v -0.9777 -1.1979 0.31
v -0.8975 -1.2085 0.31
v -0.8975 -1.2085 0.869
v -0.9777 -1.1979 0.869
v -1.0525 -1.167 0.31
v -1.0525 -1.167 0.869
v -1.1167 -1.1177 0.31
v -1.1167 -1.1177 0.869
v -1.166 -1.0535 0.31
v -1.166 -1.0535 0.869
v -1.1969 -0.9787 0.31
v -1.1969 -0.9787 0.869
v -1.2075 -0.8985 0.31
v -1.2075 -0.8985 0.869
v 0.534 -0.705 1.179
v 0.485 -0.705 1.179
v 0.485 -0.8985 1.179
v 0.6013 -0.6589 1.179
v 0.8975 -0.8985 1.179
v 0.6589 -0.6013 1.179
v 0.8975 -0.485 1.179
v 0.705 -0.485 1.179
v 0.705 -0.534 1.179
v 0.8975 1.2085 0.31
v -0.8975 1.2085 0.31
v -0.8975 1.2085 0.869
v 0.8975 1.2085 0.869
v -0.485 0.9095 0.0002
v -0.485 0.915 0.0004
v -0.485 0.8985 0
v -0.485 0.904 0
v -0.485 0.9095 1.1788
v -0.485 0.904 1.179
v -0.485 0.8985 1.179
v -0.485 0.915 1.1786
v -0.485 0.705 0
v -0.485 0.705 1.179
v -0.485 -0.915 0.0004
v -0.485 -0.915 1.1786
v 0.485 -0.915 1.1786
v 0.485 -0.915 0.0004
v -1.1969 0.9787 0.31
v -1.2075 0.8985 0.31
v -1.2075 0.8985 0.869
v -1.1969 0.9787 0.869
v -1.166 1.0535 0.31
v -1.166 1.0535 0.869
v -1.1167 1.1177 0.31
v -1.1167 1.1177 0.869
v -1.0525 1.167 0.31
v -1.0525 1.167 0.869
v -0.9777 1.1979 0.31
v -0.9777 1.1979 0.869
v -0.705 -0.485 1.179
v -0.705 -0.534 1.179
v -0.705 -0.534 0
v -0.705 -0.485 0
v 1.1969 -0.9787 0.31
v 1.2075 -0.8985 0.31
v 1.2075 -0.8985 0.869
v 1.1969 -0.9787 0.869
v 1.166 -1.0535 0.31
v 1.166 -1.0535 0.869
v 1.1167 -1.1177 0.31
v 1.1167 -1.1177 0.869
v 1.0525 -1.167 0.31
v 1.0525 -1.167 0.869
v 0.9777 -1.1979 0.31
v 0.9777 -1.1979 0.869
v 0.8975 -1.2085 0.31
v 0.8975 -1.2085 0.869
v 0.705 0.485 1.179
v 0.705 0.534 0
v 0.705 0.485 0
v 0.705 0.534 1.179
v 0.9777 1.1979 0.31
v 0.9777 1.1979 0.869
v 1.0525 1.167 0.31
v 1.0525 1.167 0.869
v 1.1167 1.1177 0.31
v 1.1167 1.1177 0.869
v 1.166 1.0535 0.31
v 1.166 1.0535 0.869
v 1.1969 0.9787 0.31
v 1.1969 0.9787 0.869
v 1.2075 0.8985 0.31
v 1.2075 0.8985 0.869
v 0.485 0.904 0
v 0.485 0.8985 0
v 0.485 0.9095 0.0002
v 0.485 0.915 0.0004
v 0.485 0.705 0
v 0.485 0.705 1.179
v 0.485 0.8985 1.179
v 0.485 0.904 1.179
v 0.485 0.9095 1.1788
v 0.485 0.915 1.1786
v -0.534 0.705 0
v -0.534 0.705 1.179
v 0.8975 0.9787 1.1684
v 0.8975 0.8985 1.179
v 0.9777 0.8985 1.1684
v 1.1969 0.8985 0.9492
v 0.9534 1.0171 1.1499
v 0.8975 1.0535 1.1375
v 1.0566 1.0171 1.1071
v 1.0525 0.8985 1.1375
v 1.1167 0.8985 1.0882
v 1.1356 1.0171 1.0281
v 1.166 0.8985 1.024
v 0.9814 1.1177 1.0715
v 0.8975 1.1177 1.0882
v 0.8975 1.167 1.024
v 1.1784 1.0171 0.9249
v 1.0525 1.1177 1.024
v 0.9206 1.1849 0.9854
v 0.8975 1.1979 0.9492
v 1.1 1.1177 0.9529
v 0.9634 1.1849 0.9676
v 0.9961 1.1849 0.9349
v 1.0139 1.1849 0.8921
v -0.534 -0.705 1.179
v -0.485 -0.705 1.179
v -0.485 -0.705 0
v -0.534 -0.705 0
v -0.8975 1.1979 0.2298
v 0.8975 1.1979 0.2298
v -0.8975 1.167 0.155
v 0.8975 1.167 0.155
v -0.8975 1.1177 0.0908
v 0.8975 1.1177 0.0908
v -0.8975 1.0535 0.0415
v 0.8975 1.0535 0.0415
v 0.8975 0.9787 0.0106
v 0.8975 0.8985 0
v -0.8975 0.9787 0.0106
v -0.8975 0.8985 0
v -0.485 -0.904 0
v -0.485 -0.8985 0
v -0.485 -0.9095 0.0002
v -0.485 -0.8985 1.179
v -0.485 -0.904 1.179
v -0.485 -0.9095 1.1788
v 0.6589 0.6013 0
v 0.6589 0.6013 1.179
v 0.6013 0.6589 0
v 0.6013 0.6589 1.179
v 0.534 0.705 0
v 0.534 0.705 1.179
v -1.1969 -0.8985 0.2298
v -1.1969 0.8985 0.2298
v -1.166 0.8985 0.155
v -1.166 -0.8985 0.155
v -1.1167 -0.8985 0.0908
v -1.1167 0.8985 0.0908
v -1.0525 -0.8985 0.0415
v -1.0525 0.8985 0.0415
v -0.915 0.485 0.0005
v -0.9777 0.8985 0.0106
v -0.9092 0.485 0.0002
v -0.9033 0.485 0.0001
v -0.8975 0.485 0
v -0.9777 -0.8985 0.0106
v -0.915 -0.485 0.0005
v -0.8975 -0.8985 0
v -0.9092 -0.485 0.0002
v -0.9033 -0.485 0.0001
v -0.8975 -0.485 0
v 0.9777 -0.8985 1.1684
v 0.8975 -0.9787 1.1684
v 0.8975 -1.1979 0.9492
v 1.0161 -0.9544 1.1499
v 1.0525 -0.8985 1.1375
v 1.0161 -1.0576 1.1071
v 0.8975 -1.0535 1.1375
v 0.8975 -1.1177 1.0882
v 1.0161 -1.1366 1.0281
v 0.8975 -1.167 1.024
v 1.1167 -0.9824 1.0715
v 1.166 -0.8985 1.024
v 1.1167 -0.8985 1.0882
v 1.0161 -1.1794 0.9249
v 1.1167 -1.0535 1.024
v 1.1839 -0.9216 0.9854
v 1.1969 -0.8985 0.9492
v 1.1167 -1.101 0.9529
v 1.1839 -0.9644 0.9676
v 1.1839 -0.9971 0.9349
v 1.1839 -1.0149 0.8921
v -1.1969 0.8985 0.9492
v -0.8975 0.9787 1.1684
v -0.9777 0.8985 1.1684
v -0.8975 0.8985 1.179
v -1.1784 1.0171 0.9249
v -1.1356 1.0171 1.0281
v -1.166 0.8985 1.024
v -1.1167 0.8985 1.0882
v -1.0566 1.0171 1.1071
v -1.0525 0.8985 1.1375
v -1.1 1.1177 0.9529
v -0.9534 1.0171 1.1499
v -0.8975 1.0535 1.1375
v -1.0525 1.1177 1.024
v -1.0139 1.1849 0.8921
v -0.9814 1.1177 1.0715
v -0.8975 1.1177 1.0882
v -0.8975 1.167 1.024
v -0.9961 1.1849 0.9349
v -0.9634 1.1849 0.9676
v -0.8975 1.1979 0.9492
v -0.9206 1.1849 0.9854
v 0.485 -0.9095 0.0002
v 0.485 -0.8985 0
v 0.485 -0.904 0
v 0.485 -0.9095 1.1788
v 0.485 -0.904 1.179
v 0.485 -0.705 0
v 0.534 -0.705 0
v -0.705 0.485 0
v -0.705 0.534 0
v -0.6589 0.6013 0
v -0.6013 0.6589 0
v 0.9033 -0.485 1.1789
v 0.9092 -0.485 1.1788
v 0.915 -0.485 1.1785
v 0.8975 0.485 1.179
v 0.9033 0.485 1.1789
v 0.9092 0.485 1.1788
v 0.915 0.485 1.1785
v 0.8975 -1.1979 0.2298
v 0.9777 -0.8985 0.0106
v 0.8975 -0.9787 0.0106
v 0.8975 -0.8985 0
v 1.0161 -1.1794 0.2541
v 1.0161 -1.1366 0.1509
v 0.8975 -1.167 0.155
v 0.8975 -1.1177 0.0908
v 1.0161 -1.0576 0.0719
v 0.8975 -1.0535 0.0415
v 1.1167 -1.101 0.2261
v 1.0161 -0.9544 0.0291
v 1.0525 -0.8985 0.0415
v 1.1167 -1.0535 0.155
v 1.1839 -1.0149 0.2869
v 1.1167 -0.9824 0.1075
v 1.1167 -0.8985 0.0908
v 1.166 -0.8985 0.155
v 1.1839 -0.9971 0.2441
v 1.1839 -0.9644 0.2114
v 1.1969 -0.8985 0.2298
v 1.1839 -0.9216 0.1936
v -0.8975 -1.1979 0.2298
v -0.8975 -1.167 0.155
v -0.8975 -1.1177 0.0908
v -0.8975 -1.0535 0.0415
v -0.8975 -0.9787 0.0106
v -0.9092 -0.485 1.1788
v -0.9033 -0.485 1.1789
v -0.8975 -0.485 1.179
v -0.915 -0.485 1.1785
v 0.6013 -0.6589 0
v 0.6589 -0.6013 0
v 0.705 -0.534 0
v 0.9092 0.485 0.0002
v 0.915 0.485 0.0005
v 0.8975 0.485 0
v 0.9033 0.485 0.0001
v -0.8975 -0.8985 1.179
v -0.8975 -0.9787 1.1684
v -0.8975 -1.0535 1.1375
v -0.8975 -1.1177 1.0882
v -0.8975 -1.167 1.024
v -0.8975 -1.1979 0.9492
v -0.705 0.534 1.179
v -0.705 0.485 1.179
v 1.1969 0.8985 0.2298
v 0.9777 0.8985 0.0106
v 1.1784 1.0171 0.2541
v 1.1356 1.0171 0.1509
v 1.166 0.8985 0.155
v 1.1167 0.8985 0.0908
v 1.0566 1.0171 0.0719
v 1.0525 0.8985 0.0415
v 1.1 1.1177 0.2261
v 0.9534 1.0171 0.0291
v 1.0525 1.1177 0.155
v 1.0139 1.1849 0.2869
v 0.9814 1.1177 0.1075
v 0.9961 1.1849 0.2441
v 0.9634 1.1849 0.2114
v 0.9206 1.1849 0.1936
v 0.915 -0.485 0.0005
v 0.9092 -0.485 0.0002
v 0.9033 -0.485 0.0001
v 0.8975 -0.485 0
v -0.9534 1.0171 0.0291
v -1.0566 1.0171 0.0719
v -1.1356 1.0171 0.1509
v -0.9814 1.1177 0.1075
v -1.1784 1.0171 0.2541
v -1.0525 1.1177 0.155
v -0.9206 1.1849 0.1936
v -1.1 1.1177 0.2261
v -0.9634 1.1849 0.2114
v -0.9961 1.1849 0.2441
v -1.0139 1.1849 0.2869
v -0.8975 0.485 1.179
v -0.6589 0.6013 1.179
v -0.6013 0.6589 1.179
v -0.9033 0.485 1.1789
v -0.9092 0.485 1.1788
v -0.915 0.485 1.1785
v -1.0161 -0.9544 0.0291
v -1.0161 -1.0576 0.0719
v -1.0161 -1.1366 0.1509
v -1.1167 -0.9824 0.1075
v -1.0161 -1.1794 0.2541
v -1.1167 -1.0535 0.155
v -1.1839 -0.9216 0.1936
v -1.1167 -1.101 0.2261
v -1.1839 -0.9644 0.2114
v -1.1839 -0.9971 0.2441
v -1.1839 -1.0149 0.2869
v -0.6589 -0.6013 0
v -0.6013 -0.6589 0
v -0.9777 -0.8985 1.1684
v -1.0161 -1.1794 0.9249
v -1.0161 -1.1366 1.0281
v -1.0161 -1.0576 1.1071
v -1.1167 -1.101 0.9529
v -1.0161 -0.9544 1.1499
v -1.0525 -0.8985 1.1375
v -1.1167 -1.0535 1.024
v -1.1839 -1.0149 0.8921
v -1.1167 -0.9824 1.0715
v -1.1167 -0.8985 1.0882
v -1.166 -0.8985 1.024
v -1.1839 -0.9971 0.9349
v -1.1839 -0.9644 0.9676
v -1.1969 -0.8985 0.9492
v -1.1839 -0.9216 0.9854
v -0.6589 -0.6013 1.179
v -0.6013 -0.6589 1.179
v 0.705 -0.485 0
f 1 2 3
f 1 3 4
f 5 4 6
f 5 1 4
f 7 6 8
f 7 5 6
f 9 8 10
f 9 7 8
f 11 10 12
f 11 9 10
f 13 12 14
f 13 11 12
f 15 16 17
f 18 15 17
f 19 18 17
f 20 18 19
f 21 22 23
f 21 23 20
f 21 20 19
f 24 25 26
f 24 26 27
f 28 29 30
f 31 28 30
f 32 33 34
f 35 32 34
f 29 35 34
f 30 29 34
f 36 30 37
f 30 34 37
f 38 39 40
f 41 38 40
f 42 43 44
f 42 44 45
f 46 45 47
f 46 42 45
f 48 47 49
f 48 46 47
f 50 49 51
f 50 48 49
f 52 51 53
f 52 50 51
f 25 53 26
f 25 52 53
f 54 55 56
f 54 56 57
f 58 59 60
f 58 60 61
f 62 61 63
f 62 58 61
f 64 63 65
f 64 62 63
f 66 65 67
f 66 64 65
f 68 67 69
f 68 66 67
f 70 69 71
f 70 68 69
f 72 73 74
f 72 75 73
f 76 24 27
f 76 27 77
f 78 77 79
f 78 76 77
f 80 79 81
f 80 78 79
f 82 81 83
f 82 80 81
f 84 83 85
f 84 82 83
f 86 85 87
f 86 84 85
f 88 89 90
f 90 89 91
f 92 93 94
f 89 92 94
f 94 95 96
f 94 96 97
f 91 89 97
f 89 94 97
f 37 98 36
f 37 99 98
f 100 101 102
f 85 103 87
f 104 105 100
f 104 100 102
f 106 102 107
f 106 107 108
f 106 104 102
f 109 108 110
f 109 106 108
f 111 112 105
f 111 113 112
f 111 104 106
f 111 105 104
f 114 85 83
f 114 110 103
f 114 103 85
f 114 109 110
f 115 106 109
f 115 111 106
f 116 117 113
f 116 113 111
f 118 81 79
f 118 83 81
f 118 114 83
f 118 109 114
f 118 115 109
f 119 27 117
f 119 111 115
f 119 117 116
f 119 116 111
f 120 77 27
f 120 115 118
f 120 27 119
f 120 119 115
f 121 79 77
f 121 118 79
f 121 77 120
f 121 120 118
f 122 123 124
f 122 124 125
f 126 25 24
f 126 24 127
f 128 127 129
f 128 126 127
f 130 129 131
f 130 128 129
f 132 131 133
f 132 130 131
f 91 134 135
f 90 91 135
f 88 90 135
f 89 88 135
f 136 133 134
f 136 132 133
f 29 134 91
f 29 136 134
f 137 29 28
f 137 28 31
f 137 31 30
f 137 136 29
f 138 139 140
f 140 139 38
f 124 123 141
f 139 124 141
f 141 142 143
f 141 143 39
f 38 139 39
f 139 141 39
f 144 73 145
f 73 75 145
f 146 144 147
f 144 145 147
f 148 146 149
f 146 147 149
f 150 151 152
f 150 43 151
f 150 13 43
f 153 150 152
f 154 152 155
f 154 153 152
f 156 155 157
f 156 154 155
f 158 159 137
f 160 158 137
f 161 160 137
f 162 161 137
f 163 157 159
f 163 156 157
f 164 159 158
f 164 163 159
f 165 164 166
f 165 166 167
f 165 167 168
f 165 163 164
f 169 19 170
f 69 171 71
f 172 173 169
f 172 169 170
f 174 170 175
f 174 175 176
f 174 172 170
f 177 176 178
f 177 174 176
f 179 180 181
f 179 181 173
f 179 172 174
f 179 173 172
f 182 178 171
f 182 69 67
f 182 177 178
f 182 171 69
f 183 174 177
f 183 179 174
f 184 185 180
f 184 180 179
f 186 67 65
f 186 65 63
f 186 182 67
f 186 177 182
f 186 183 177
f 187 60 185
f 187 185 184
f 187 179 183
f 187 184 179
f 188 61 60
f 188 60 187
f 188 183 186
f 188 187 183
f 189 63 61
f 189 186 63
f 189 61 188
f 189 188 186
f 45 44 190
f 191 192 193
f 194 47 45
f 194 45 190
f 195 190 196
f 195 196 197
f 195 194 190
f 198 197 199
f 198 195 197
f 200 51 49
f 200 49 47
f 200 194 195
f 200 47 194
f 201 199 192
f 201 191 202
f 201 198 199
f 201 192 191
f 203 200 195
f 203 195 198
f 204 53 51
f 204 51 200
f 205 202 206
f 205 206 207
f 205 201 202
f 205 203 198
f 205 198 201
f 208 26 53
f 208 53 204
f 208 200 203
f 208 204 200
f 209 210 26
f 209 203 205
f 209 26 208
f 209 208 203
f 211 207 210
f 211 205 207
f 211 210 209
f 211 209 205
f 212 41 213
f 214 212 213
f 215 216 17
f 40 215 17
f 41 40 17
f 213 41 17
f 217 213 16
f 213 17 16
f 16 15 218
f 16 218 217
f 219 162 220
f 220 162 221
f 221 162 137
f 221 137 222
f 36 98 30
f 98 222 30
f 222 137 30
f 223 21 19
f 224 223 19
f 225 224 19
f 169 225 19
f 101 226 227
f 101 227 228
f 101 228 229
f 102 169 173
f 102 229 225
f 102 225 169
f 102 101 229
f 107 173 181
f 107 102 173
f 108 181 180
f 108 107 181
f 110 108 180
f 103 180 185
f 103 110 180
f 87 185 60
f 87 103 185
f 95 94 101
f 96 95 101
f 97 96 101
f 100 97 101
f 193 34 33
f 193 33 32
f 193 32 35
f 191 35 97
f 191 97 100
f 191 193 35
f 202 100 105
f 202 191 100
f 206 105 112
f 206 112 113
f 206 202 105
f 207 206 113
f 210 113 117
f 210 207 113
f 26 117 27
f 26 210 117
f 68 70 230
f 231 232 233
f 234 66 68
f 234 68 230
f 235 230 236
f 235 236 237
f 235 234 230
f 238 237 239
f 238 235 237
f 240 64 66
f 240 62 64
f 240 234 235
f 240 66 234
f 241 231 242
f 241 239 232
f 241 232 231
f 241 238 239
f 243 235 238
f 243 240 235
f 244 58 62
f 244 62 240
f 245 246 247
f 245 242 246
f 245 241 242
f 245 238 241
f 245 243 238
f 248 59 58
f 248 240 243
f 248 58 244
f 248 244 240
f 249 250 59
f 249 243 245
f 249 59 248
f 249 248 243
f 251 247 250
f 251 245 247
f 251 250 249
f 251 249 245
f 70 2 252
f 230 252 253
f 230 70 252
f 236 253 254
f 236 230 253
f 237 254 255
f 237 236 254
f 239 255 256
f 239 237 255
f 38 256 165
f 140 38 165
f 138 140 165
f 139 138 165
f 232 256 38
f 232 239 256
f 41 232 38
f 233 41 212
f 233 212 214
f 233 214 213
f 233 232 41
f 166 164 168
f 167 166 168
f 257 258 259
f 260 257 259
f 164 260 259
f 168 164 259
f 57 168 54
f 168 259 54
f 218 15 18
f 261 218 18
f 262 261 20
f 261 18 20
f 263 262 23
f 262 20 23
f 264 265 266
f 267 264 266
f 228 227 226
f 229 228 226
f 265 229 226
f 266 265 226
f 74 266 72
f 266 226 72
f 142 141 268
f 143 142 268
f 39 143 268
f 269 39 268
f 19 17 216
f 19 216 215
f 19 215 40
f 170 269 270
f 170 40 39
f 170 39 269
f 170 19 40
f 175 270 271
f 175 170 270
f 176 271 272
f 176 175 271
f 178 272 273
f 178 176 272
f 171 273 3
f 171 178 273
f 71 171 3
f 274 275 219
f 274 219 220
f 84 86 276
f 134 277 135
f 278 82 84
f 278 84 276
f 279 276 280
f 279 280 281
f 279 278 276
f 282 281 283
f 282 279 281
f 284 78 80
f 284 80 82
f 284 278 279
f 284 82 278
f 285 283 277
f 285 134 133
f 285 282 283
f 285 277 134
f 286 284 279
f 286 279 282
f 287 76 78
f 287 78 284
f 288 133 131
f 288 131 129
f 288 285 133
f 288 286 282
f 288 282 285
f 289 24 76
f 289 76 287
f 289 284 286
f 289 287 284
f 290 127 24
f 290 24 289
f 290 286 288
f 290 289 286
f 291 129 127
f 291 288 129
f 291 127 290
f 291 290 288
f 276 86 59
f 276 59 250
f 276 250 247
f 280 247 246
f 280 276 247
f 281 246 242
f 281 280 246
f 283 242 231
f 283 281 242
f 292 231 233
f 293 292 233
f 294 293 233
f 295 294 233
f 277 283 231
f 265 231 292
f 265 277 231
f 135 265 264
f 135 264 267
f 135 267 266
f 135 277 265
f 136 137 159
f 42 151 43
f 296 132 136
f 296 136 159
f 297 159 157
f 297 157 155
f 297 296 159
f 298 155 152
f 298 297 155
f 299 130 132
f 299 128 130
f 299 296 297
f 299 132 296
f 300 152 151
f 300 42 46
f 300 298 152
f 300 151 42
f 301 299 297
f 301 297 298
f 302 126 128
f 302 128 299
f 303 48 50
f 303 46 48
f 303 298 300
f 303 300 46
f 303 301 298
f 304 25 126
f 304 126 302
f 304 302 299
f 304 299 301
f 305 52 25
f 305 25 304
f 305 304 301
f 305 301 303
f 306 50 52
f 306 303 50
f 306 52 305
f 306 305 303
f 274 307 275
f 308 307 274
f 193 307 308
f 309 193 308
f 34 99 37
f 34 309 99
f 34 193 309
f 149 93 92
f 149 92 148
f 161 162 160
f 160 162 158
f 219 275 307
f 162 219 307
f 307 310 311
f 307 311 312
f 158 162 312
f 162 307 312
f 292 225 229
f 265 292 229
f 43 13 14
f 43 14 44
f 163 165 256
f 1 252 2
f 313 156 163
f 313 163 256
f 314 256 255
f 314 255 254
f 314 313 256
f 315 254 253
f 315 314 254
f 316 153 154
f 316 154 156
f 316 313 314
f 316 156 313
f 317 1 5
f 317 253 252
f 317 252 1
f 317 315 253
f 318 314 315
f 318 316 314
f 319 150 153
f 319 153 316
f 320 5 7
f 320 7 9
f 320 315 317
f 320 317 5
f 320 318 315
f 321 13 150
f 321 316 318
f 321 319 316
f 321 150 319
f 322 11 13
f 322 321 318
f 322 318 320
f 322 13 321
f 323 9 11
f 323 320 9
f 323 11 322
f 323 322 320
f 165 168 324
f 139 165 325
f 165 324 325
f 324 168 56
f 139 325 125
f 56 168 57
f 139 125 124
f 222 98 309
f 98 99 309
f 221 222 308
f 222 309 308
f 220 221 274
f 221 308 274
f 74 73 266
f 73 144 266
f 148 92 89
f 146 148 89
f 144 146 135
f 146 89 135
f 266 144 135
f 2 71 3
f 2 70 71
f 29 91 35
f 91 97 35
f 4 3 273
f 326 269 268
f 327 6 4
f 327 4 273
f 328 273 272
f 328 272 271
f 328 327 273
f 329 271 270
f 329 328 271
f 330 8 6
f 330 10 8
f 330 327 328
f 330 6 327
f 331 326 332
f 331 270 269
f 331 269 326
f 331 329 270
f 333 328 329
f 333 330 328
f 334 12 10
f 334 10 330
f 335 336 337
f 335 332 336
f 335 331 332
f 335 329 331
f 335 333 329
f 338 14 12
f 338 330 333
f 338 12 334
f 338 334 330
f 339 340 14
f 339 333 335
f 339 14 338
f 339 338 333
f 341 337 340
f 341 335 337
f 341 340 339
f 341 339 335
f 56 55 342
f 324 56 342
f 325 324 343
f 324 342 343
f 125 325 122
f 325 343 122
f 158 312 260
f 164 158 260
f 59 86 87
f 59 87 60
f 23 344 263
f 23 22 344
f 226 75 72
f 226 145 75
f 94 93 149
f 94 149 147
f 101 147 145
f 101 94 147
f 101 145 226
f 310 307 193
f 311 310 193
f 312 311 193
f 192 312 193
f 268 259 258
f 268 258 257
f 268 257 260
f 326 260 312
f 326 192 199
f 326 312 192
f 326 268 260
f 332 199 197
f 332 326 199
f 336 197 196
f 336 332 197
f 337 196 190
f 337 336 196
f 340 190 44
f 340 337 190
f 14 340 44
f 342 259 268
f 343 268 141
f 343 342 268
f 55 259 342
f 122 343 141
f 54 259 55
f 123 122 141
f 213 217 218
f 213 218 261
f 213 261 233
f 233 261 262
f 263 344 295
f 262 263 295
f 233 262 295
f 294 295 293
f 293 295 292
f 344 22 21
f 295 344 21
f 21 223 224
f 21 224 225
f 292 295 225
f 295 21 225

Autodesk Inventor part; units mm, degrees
ref_plane "YZ Plane" through (0, 0, 0) normal (1, 0, 0) x (0, 1, 0)
ref_plane "XZ Plane" through (0, 0, 0) normal (0, 1, 0) x (-1, 0, 0)
ref_plane "XY Plane" through (0, 0, 0) normal (0, 0, 1) x (1, 0, 0)
sketch "Sketch1" plane through (0, 0, 0) normal (0, 0, 1) x (1, 0, 0)
  line L0 (-1.2075, 1.2085) -> (1.2075, 1.2085)
  line L1 (1.2075, 1.2085) -> (1.2075, -1.2085)
  line L2 (1.2075, -1.2085) -> (-1.2075, -1.2085)
  line L3 (-1.2075, -1.2085) -> (-1.2075, 1.2085)
  point P0 (0, 0)
  point P1 (0, 0)
  point P2 (0, 1.2085)
  point P3 (-1.2075, 0)
  dimension "d0" = 2.415
  dimension "d1" = 2.417
extrude "Extrusion1" add sketch "Sketch1" along normal blind 1.179
sketch "Sketch2" plane through (0, 0, 1.179) normal (0, 0, 1) x (1, 0, 0)
  line L0 (-0.705, 0.705) -> (-0.534, 0.705)
  line L1 (0.705, 0.705) -> (0.705, 0.534)
  line L2 (0.705, -0.705) -> (0.534, -0.705)
  line L3 (-0.705, -0.705) -> (-0.705, -0.534)
  line L4 (0, -1.6919) -> (0, 1.6919) projected
  line L5 (-1.6905, 0) -> (1.6905, 0) projected
  arc A0 (-0.534, 0.705) -> (-0.705, 0.534) centre (-0.3185, 0.3185) ccw
  arc A1 (0.705, 0.534) -> (0.534, 0.705) centre (0.3185, 0.3185) ccw
  arc A2 (-0.705, -0.534) -> (-0.534, -0.705) centre (-0.3185, -0.3185) ccw
  arc A3 (0.534, -0.705) -> (0.705, -0.534) centre (0.3185, -0.3185) ccw
  line L6 (0.705, -0.534) -> (0.705, -0.705)
  line L7 (0.534, -0.705) -> (-0.534, -0.705)
  line L8 (-0.534, -0.705) -> (-0.705, -0.705)
  line L9 (-0.705, -0.534) -> (-0.705, 0.534)
  line L10 (-0.705, 0.534) -> (-0.705, 0.705)
  line L11 (-0.534, 0.705) -> (0.534, 0.705)
  line L12 (0.534, 0.705) -> (0.705, 0.705)
  line L13 (0.705, 0.534) -> (0.705, -0.534)
  point P0 (0, 0)
  point P1 (-0.705, 0)
  point P2 (0, 0.705)
  dimension "d4" = 1.41
  dimension "d5" = 1.41
  dimension "d7" = 0.171
  dimension "d8" = 0.171
extrude "Extrusion2" cut sketch "Sketch2" against normal through all contours L11 L4 L5 L9 A0 | L11 A1 L13 L5 L4 | L5 L4 L7 A2 L9 | L5 L13 A3 L7 L4
sketch "Sketch3" plane through (0, 0, 1.179) normal (0, 0, 1) x (1, 0, 0)
  line L0 (-0.705, -0.534) -> (-0.705, 0.534) projected
  line L1 (-0.705, 0.485) -> (-0.915, 0.485)
  line L2 (-0.915, 0.485) -> (-0.915, -0.485)
  line L3 (-0.915, -0.485) -> (-0.705, -0.485)
  line L4 (-0.705, -0.485) -> (-0.705, 0.485)
  line L5 (-1.6905, 0) -> (1.6905, 0) projected
  line L6 (0, -1.6919) -> (0, 1.6919) projected
  point P0 (0, 0)
  point P1 (-0.915, 0)
  dimension "d11" = 0.21
  dimension "d12" = 0.97
extrude "Extrusion3" cut sketch "Sketch3" against normal through all
pattern_circular "Circular Pattern1" count 4 over 360 about axis through (0, 0, -10) along (0, 0, 1) of "Extrusion3"
fillet "Fillet1" radius 0.31 12 edges at (-1.2075, 1.2085, 0.5895) (0, 1.2085, 1.179) (1.2075, 1.2085, 0.5895) (0, 1.2085, 0) (1.2075, 0, 0) (1.2075, 0, 1.179) (-1.2075, 0, 1.179) (-1.2075, 0, 0) (-1.2075, -1.2085, 0.5895) (0, -1.2085, 1.179) (0, -1.2085, 0) (1.2075, -1.2085, 0.5895)
properties part number "Frame_Support2" material "Stainless Steel"
